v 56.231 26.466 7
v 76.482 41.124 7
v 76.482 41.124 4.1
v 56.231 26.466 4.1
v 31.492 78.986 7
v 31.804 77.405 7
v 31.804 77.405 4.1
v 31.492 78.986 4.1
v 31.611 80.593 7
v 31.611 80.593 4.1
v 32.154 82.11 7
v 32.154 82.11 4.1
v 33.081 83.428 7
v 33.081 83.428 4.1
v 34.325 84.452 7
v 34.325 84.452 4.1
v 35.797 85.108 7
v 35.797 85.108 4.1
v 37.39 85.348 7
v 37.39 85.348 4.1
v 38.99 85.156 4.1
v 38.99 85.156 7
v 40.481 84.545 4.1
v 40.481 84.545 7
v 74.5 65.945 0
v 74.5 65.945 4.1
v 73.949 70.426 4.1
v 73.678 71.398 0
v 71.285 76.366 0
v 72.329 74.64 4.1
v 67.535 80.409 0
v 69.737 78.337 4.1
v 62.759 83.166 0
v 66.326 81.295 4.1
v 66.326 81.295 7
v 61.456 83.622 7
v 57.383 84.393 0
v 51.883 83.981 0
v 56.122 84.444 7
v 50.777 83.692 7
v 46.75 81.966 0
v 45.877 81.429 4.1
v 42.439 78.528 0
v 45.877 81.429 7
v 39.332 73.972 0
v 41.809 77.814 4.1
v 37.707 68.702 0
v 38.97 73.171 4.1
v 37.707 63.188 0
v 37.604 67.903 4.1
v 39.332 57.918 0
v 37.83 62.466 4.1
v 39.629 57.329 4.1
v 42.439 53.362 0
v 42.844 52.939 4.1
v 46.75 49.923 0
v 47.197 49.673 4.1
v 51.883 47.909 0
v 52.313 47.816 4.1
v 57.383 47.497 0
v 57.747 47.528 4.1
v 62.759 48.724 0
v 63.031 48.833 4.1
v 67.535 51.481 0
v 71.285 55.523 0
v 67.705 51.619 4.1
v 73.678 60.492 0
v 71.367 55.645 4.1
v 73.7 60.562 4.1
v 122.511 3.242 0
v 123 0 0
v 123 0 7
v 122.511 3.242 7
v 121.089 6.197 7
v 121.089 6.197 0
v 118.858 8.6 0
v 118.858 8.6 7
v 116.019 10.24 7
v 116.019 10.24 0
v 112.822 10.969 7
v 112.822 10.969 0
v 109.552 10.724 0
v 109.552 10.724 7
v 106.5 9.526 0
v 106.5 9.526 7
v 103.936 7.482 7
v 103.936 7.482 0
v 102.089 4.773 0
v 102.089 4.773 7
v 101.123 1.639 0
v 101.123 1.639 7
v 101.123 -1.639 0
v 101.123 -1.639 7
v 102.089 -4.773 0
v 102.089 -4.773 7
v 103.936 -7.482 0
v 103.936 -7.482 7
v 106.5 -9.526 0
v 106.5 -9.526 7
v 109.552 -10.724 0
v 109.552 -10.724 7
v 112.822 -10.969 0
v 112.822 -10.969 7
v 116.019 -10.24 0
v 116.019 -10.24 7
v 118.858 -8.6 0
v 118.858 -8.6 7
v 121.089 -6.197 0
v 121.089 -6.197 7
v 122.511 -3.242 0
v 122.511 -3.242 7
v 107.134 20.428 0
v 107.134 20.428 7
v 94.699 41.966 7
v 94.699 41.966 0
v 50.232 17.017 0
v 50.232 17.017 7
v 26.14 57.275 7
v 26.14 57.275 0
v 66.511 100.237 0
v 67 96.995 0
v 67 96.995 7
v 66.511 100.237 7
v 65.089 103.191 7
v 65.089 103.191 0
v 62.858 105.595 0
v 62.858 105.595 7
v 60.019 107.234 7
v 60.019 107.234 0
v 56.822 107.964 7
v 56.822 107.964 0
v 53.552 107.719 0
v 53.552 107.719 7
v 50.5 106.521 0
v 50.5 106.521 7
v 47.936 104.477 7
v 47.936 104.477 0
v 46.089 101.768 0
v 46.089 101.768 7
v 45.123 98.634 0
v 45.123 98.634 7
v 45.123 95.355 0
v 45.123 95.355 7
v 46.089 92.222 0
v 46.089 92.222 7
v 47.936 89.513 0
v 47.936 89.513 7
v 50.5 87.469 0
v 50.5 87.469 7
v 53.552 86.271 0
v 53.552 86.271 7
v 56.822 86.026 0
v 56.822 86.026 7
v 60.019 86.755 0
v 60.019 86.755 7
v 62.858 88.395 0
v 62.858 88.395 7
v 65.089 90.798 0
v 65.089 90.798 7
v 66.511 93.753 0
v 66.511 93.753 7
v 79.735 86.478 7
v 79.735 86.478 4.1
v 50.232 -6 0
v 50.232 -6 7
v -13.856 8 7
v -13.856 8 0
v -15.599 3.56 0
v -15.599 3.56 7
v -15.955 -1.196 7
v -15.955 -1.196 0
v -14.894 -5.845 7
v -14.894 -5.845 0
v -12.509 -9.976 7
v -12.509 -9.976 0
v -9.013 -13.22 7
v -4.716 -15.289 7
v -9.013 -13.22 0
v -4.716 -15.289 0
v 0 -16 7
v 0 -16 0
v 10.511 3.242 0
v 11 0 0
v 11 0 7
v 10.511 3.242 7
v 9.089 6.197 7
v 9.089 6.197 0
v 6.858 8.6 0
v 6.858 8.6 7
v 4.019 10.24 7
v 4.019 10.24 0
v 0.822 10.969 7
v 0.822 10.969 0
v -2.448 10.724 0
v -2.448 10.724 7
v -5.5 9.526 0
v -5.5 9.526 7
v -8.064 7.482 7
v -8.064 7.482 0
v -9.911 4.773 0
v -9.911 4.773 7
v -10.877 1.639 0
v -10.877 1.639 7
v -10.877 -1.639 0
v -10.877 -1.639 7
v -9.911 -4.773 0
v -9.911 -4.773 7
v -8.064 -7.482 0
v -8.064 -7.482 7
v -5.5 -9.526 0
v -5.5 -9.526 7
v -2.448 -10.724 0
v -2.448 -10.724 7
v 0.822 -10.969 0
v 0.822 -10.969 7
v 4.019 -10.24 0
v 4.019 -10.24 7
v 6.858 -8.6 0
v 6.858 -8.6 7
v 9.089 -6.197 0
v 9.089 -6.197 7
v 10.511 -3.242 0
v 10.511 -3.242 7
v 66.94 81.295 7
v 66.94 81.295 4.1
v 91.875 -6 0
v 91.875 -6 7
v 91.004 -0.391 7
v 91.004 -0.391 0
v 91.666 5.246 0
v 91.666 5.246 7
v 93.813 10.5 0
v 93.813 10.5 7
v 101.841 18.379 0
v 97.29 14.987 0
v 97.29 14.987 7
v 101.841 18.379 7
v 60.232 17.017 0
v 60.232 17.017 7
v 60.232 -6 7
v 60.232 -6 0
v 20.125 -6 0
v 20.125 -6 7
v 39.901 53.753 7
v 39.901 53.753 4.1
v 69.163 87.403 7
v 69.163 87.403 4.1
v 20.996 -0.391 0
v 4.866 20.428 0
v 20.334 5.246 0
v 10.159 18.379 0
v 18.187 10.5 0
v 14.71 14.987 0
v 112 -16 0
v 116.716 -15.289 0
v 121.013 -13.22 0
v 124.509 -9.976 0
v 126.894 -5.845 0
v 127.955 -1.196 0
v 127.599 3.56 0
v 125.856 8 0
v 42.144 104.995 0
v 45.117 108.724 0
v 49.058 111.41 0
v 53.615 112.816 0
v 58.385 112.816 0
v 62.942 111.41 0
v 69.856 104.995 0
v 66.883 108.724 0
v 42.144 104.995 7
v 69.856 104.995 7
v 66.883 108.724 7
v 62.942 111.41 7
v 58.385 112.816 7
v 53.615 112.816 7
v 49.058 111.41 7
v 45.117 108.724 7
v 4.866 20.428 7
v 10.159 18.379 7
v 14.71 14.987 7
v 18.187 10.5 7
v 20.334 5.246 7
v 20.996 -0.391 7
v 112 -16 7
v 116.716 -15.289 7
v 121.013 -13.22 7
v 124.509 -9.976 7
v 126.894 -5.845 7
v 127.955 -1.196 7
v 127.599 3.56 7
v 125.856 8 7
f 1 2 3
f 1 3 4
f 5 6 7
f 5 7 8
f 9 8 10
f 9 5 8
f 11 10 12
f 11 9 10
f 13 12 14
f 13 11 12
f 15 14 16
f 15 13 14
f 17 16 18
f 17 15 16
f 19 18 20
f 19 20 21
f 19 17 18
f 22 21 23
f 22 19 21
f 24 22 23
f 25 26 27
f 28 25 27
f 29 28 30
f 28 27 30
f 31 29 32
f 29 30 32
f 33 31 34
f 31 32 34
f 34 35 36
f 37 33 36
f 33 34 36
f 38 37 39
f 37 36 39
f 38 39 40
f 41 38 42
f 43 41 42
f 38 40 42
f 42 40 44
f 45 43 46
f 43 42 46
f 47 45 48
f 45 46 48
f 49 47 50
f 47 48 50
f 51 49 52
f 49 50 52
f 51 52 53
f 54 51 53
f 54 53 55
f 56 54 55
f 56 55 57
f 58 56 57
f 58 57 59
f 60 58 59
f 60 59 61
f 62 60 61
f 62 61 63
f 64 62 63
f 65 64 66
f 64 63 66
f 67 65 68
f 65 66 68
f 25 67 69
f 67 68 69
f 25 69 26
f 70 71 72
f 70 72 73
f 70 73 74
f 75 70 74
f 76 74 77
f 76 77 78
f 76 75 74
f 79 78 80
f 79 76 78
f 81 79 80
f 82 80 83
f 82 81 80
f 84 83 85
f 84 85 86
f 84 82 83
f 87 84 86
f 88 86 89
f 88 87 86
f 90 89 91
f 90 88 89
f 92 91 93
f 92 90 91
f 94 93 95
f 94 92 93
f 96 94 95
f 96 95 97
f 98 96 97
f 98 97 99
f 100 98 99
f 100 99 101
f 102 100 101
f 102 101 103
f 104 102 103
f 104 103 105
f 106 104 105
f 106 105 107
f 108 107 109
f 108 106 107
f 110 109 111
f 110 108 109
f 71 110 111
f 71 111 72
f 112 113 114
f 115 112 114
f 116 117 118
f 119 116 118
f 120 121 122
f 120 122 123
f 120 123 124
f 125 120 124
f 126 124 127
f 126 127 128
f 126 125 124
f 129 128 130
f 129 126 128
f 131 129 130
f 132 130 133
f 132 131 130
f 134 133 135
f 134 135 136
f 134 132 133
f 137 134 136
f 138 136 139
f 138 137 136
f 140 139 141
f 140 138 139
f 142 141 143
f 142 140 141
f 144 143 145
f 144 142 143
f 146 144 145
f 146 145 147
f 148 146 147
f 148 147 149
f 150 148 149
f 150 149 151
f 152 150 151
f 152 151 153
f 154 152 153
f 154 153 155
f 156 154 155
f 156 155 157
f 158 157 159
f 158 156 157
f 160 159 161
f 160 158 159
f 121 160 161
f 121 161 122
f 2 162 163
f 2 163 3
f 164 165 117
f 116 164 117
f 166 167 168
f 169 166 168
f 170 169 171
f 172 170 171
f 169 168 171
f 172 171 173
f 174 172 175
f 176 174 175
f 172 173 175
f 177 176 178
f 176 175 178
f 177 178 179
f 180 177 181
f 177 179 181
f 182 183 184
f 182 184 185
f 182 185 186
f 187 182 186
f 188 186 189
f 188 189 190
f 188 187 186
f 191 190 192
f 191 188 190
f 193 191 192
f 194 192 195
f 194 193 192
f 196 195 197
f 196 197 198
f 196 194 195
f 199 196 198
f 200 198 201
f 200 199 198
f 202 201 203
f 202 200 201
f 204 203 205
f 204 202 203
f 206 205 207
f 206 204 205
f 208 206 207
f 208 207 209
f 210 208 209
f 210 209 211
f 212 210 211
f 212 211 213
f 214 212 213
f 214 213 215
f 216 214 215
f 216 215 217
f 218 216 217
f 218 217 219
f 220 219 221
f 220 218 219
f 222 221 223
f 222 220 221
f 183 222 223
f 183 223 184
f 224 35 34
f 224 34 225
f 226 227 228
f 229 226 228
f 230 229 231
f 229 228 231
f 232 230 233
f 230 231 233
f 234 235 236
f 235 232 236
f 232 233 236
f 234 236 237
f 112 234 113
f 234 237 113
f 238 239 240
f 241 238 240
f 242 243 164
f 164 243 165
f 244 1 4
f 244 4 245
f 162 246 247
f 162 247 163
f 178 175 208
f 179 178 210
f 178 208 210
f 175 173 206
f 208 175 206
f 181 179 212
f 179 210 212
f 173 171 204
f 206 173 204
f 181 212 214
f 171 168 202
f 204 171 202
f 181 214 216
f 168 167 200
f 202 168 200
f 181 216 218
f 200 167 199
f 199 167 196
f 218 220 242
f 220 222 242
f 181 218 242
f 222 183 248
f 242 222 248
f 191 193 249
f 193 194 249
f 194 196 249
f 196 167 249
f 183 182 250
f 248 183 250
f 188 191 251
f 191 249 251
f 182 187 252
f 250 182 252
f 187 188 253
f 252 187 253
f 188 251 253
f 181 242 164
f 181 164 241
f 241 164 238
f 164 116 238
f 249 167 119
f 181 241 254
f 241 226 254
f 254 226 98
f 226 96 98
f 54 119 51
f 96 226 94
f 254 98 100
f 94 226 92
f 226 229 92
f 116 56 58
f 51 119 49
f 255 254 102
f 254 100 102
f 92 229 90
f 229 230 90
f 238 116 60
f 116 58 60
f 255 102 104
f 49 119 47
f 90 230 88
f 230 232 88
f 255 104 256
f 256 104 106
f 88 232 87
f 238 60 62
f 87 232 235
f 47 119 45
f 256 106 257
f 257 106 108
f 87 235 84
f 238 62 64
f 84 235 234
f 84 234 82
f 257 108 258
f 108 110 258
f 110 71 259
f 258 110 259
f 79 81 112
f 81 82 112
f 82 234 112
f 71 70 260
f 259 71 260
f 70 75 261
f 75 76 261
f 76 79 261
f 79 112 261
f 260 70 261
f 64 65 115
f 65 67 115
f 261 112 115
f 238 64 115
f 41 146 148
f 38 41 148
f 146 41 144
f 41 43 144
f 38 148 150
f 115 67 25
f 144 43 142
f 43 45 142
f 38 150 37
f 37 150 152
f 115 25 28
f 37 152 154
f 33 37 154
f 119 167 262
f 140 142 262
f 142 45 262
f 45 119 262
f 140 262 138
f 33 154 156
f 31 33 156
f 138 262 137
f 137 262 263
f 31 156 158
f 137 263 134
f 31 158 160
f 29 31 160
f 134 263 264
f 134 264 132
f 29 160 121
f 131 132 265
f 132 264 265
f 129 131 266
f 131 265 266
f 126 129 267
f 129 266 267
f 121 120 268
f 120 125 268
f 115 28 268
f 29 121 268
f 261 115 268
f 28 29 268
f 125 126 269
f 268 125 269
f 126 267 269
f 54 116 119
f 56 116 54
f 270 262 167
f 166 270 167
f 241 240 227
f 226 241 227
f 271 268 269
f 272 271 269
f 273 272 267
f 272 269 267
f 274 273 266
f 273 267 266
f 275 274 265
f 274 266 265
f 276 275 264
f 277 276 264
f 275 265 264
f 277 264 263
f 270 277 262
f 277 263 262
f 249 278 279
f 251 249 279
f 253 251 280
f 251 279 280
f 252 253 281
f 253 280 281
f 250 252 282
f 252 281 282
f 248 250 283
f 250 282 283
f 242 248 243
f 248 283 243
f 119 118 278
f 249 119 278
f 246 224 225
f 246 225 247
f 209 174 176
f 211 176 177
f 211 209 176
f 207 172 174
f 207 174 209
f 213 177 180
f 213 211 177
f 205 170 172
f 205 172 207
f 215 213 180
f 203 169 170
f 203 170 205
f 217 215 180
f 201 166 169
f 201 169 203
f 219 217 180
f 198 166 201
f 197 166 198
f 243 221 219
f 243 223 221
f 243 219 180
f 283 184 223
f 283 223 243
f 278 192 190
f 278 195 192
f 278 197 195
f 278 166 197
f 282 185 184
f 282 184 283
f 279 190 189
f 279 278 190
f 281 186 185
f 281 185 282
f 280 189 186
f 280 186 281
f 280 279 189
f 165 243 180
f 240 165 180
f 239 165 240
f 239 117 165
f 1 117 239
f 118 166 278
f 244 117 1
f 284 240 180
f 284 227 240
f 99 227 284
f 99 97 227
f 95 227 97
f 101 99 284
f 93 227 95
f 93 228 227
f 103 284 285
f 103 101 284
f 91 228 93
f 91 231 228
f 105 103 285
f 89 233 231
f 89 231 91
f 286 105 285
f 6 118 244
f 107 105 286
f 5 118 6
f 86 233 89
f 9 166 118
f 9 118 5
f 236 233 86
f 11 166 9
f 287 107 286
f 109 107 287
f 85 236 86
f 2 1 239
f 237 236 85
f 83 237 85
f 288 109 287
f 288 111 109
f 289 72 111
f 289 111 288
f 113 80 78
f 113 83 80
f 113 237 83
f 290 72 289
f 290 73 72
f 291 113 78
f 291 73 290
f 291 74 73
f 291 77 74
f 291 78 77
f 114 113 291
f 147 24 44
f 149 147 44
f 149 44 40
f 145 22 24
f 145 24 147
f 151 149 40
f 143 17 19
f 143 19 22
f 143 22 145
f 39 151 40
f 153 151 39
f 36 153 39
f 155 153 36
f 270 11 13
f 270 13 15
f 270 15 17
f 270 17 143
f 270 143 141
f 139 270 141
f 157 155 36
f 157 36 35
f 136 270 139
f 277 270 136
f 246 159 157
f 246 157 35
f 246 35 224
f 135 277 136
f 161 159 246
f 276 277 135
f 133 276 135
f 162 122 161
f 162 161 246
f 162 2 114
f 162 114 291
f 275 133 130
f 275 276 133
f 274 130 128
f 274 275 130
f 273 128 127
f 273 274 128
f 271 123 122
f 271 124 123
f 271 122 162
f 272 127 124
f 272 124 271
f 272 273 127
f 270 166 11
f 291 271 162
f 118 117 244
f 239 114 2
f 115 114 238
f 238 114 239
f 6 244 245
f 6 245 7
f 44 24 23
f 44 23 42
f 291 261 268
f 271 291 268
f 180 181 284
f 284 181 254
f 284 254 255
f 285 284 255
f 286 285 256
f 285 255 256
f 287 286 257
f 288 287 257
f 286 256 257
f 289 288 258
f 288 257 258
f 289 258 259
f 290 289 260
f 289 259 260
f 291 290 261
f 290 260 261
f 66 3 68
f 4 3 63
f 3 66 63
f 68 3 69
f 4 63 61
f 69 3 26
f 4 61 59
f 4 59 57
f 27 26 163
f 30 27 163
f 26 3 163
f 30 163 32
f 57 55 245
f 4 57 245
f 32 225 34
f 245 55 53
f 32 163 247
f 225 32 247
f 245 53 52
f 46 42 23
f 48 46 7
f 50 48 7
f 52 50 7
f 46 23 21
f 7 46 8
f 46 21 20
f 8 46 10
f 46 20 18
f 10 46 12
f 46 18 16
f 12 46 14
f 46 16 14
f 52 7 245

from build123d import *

# Parameters (mm, degrees)
SKETCH1_R           = 11
BOSS_EXTRUDE1_DEPTH = 7
SKETCH3_R           = 18.5
CUT_EXTRUDE1_DEPTH  = 8
CUT_EXTRUDE2_DEPTH  = 2.9
CUT_EXTRUDE3_DEPTH  = 8


with BuildPart() as part:
    # Sketch1 → Boss-Extrude1 (new body)
    with BuildSketch(Plane.XY):
        with BuildLine():
            Line((42.143593539, 104.994845224), (-13.856406461, 8))
            ThreePointArc((-13.856406461, 8), (-13.856406461, -8), (0, -16))
            Line((0, -16), (112, -16))
            ThreePointArc((112, -16), (125.856406461, -8), (125.856406461, 8))
            Line((125.856406461, 8), (69.856406461, 104.994845224))
            ThreePointArc((69.856406461, 104.994845224), (56, 112.994845224), (42.143593539, 104.994845224))
        make_face()
        Circle(SKETCH1_R, mode=Mode.SUBTRACT)
        with Locations((112, 0)):
            Circle(SKETCH1_R, mode=Mode.SUBTRACT)
        with Locations((56, 96.994845224)):
            Circle(SKETCH1_R, mode=Mode.SUBTRACT)
    extrude(amount=BOSS_EXTRUDE1_DEPTH)

    # Sketch3 → Cut-Extrude1 (cut, through all)
    with BuildSketch(Plane.XY.offset(7)):
        with Locations((56, 65.944845224)):
            Circle(SKETCH3_R)
    extrude(amount=-CUT_EXTRUDE1_DEPTH, mode=Mode.SUBTRACT)

    # Sketch4 → Cut-Extrude2 (cut)
    with BuildSketch(Plane.XY.offset(7)):
        with BuildLine():
            Line((46.11, 81.294845224), (66.94, 81.294845224))
            Line((66.94, 81.294845224), (69.163130932, 87.402847259))
            Line((69.163130932, 87.402847259), (79.735172855, 86.47791344))
            Line((79.735172855, 86.47791344), (76.482447168, 41.124405576))
            Line((76.482447168, 41.124405576), (56.230844768, 26.465872217))
            Line((56.230844768, 26.465872217), (39.901277947, 53.752961607))
            Line((39.901277947, 53.752961607), (31.804248297, 77.405405685))
            ThreePointArc((31.804248297, 77.405405685), (33.66849594, 83.981842037), (40.480834875, 84.544845224))
            Line((40.480834875, 84.544845224), (46.11, 81.294845224))
        make_face()
    extrude(amount=-CUT_EXTRUDE2_DEPTH, mode=Mode.SUBTRACT)

    # Sketch5 → Cut-Extrude3 (cut, through all)
    with BuildSketch(Plane.XY.offset(7)):
        with BuildLine():
            Line((26.139616059, 57.275143104), (4.866153476, 20.428425058))
            ThreePointArc((4.866153476, 20.428425058), (18.186533479, 10.5), (20.124611797, -6))
            Line((20.124611797, -6), (50.231546624, -6))
            Line((50.231546624, -6), (50.231546624, 17.016961725))
            Line((50.231546624, 17.016961725), (26.139616059, 57.275143104))
        make_face()
        with BuildLine():
            Line((60.231546624, 17.016961725), (60.231546624, -6))
            Line((60.231546624, -6), (91.875388203, -6))
            ThreePointArc((91.875388203, -6), (93.813466521, 10.5), (107.133846524, 20.428425058))
            Line((107.133846524, 20.428425058), (94.699401361, 41.965515845))
            Line((94.699401361, 41.965515845), (60.231546624, 17.016961725))
        make_face()
    extrude(amount=-CUT_EXTRUDE3_DEPTH, mode=Mode.SUBTRACT)


solid = part.part
